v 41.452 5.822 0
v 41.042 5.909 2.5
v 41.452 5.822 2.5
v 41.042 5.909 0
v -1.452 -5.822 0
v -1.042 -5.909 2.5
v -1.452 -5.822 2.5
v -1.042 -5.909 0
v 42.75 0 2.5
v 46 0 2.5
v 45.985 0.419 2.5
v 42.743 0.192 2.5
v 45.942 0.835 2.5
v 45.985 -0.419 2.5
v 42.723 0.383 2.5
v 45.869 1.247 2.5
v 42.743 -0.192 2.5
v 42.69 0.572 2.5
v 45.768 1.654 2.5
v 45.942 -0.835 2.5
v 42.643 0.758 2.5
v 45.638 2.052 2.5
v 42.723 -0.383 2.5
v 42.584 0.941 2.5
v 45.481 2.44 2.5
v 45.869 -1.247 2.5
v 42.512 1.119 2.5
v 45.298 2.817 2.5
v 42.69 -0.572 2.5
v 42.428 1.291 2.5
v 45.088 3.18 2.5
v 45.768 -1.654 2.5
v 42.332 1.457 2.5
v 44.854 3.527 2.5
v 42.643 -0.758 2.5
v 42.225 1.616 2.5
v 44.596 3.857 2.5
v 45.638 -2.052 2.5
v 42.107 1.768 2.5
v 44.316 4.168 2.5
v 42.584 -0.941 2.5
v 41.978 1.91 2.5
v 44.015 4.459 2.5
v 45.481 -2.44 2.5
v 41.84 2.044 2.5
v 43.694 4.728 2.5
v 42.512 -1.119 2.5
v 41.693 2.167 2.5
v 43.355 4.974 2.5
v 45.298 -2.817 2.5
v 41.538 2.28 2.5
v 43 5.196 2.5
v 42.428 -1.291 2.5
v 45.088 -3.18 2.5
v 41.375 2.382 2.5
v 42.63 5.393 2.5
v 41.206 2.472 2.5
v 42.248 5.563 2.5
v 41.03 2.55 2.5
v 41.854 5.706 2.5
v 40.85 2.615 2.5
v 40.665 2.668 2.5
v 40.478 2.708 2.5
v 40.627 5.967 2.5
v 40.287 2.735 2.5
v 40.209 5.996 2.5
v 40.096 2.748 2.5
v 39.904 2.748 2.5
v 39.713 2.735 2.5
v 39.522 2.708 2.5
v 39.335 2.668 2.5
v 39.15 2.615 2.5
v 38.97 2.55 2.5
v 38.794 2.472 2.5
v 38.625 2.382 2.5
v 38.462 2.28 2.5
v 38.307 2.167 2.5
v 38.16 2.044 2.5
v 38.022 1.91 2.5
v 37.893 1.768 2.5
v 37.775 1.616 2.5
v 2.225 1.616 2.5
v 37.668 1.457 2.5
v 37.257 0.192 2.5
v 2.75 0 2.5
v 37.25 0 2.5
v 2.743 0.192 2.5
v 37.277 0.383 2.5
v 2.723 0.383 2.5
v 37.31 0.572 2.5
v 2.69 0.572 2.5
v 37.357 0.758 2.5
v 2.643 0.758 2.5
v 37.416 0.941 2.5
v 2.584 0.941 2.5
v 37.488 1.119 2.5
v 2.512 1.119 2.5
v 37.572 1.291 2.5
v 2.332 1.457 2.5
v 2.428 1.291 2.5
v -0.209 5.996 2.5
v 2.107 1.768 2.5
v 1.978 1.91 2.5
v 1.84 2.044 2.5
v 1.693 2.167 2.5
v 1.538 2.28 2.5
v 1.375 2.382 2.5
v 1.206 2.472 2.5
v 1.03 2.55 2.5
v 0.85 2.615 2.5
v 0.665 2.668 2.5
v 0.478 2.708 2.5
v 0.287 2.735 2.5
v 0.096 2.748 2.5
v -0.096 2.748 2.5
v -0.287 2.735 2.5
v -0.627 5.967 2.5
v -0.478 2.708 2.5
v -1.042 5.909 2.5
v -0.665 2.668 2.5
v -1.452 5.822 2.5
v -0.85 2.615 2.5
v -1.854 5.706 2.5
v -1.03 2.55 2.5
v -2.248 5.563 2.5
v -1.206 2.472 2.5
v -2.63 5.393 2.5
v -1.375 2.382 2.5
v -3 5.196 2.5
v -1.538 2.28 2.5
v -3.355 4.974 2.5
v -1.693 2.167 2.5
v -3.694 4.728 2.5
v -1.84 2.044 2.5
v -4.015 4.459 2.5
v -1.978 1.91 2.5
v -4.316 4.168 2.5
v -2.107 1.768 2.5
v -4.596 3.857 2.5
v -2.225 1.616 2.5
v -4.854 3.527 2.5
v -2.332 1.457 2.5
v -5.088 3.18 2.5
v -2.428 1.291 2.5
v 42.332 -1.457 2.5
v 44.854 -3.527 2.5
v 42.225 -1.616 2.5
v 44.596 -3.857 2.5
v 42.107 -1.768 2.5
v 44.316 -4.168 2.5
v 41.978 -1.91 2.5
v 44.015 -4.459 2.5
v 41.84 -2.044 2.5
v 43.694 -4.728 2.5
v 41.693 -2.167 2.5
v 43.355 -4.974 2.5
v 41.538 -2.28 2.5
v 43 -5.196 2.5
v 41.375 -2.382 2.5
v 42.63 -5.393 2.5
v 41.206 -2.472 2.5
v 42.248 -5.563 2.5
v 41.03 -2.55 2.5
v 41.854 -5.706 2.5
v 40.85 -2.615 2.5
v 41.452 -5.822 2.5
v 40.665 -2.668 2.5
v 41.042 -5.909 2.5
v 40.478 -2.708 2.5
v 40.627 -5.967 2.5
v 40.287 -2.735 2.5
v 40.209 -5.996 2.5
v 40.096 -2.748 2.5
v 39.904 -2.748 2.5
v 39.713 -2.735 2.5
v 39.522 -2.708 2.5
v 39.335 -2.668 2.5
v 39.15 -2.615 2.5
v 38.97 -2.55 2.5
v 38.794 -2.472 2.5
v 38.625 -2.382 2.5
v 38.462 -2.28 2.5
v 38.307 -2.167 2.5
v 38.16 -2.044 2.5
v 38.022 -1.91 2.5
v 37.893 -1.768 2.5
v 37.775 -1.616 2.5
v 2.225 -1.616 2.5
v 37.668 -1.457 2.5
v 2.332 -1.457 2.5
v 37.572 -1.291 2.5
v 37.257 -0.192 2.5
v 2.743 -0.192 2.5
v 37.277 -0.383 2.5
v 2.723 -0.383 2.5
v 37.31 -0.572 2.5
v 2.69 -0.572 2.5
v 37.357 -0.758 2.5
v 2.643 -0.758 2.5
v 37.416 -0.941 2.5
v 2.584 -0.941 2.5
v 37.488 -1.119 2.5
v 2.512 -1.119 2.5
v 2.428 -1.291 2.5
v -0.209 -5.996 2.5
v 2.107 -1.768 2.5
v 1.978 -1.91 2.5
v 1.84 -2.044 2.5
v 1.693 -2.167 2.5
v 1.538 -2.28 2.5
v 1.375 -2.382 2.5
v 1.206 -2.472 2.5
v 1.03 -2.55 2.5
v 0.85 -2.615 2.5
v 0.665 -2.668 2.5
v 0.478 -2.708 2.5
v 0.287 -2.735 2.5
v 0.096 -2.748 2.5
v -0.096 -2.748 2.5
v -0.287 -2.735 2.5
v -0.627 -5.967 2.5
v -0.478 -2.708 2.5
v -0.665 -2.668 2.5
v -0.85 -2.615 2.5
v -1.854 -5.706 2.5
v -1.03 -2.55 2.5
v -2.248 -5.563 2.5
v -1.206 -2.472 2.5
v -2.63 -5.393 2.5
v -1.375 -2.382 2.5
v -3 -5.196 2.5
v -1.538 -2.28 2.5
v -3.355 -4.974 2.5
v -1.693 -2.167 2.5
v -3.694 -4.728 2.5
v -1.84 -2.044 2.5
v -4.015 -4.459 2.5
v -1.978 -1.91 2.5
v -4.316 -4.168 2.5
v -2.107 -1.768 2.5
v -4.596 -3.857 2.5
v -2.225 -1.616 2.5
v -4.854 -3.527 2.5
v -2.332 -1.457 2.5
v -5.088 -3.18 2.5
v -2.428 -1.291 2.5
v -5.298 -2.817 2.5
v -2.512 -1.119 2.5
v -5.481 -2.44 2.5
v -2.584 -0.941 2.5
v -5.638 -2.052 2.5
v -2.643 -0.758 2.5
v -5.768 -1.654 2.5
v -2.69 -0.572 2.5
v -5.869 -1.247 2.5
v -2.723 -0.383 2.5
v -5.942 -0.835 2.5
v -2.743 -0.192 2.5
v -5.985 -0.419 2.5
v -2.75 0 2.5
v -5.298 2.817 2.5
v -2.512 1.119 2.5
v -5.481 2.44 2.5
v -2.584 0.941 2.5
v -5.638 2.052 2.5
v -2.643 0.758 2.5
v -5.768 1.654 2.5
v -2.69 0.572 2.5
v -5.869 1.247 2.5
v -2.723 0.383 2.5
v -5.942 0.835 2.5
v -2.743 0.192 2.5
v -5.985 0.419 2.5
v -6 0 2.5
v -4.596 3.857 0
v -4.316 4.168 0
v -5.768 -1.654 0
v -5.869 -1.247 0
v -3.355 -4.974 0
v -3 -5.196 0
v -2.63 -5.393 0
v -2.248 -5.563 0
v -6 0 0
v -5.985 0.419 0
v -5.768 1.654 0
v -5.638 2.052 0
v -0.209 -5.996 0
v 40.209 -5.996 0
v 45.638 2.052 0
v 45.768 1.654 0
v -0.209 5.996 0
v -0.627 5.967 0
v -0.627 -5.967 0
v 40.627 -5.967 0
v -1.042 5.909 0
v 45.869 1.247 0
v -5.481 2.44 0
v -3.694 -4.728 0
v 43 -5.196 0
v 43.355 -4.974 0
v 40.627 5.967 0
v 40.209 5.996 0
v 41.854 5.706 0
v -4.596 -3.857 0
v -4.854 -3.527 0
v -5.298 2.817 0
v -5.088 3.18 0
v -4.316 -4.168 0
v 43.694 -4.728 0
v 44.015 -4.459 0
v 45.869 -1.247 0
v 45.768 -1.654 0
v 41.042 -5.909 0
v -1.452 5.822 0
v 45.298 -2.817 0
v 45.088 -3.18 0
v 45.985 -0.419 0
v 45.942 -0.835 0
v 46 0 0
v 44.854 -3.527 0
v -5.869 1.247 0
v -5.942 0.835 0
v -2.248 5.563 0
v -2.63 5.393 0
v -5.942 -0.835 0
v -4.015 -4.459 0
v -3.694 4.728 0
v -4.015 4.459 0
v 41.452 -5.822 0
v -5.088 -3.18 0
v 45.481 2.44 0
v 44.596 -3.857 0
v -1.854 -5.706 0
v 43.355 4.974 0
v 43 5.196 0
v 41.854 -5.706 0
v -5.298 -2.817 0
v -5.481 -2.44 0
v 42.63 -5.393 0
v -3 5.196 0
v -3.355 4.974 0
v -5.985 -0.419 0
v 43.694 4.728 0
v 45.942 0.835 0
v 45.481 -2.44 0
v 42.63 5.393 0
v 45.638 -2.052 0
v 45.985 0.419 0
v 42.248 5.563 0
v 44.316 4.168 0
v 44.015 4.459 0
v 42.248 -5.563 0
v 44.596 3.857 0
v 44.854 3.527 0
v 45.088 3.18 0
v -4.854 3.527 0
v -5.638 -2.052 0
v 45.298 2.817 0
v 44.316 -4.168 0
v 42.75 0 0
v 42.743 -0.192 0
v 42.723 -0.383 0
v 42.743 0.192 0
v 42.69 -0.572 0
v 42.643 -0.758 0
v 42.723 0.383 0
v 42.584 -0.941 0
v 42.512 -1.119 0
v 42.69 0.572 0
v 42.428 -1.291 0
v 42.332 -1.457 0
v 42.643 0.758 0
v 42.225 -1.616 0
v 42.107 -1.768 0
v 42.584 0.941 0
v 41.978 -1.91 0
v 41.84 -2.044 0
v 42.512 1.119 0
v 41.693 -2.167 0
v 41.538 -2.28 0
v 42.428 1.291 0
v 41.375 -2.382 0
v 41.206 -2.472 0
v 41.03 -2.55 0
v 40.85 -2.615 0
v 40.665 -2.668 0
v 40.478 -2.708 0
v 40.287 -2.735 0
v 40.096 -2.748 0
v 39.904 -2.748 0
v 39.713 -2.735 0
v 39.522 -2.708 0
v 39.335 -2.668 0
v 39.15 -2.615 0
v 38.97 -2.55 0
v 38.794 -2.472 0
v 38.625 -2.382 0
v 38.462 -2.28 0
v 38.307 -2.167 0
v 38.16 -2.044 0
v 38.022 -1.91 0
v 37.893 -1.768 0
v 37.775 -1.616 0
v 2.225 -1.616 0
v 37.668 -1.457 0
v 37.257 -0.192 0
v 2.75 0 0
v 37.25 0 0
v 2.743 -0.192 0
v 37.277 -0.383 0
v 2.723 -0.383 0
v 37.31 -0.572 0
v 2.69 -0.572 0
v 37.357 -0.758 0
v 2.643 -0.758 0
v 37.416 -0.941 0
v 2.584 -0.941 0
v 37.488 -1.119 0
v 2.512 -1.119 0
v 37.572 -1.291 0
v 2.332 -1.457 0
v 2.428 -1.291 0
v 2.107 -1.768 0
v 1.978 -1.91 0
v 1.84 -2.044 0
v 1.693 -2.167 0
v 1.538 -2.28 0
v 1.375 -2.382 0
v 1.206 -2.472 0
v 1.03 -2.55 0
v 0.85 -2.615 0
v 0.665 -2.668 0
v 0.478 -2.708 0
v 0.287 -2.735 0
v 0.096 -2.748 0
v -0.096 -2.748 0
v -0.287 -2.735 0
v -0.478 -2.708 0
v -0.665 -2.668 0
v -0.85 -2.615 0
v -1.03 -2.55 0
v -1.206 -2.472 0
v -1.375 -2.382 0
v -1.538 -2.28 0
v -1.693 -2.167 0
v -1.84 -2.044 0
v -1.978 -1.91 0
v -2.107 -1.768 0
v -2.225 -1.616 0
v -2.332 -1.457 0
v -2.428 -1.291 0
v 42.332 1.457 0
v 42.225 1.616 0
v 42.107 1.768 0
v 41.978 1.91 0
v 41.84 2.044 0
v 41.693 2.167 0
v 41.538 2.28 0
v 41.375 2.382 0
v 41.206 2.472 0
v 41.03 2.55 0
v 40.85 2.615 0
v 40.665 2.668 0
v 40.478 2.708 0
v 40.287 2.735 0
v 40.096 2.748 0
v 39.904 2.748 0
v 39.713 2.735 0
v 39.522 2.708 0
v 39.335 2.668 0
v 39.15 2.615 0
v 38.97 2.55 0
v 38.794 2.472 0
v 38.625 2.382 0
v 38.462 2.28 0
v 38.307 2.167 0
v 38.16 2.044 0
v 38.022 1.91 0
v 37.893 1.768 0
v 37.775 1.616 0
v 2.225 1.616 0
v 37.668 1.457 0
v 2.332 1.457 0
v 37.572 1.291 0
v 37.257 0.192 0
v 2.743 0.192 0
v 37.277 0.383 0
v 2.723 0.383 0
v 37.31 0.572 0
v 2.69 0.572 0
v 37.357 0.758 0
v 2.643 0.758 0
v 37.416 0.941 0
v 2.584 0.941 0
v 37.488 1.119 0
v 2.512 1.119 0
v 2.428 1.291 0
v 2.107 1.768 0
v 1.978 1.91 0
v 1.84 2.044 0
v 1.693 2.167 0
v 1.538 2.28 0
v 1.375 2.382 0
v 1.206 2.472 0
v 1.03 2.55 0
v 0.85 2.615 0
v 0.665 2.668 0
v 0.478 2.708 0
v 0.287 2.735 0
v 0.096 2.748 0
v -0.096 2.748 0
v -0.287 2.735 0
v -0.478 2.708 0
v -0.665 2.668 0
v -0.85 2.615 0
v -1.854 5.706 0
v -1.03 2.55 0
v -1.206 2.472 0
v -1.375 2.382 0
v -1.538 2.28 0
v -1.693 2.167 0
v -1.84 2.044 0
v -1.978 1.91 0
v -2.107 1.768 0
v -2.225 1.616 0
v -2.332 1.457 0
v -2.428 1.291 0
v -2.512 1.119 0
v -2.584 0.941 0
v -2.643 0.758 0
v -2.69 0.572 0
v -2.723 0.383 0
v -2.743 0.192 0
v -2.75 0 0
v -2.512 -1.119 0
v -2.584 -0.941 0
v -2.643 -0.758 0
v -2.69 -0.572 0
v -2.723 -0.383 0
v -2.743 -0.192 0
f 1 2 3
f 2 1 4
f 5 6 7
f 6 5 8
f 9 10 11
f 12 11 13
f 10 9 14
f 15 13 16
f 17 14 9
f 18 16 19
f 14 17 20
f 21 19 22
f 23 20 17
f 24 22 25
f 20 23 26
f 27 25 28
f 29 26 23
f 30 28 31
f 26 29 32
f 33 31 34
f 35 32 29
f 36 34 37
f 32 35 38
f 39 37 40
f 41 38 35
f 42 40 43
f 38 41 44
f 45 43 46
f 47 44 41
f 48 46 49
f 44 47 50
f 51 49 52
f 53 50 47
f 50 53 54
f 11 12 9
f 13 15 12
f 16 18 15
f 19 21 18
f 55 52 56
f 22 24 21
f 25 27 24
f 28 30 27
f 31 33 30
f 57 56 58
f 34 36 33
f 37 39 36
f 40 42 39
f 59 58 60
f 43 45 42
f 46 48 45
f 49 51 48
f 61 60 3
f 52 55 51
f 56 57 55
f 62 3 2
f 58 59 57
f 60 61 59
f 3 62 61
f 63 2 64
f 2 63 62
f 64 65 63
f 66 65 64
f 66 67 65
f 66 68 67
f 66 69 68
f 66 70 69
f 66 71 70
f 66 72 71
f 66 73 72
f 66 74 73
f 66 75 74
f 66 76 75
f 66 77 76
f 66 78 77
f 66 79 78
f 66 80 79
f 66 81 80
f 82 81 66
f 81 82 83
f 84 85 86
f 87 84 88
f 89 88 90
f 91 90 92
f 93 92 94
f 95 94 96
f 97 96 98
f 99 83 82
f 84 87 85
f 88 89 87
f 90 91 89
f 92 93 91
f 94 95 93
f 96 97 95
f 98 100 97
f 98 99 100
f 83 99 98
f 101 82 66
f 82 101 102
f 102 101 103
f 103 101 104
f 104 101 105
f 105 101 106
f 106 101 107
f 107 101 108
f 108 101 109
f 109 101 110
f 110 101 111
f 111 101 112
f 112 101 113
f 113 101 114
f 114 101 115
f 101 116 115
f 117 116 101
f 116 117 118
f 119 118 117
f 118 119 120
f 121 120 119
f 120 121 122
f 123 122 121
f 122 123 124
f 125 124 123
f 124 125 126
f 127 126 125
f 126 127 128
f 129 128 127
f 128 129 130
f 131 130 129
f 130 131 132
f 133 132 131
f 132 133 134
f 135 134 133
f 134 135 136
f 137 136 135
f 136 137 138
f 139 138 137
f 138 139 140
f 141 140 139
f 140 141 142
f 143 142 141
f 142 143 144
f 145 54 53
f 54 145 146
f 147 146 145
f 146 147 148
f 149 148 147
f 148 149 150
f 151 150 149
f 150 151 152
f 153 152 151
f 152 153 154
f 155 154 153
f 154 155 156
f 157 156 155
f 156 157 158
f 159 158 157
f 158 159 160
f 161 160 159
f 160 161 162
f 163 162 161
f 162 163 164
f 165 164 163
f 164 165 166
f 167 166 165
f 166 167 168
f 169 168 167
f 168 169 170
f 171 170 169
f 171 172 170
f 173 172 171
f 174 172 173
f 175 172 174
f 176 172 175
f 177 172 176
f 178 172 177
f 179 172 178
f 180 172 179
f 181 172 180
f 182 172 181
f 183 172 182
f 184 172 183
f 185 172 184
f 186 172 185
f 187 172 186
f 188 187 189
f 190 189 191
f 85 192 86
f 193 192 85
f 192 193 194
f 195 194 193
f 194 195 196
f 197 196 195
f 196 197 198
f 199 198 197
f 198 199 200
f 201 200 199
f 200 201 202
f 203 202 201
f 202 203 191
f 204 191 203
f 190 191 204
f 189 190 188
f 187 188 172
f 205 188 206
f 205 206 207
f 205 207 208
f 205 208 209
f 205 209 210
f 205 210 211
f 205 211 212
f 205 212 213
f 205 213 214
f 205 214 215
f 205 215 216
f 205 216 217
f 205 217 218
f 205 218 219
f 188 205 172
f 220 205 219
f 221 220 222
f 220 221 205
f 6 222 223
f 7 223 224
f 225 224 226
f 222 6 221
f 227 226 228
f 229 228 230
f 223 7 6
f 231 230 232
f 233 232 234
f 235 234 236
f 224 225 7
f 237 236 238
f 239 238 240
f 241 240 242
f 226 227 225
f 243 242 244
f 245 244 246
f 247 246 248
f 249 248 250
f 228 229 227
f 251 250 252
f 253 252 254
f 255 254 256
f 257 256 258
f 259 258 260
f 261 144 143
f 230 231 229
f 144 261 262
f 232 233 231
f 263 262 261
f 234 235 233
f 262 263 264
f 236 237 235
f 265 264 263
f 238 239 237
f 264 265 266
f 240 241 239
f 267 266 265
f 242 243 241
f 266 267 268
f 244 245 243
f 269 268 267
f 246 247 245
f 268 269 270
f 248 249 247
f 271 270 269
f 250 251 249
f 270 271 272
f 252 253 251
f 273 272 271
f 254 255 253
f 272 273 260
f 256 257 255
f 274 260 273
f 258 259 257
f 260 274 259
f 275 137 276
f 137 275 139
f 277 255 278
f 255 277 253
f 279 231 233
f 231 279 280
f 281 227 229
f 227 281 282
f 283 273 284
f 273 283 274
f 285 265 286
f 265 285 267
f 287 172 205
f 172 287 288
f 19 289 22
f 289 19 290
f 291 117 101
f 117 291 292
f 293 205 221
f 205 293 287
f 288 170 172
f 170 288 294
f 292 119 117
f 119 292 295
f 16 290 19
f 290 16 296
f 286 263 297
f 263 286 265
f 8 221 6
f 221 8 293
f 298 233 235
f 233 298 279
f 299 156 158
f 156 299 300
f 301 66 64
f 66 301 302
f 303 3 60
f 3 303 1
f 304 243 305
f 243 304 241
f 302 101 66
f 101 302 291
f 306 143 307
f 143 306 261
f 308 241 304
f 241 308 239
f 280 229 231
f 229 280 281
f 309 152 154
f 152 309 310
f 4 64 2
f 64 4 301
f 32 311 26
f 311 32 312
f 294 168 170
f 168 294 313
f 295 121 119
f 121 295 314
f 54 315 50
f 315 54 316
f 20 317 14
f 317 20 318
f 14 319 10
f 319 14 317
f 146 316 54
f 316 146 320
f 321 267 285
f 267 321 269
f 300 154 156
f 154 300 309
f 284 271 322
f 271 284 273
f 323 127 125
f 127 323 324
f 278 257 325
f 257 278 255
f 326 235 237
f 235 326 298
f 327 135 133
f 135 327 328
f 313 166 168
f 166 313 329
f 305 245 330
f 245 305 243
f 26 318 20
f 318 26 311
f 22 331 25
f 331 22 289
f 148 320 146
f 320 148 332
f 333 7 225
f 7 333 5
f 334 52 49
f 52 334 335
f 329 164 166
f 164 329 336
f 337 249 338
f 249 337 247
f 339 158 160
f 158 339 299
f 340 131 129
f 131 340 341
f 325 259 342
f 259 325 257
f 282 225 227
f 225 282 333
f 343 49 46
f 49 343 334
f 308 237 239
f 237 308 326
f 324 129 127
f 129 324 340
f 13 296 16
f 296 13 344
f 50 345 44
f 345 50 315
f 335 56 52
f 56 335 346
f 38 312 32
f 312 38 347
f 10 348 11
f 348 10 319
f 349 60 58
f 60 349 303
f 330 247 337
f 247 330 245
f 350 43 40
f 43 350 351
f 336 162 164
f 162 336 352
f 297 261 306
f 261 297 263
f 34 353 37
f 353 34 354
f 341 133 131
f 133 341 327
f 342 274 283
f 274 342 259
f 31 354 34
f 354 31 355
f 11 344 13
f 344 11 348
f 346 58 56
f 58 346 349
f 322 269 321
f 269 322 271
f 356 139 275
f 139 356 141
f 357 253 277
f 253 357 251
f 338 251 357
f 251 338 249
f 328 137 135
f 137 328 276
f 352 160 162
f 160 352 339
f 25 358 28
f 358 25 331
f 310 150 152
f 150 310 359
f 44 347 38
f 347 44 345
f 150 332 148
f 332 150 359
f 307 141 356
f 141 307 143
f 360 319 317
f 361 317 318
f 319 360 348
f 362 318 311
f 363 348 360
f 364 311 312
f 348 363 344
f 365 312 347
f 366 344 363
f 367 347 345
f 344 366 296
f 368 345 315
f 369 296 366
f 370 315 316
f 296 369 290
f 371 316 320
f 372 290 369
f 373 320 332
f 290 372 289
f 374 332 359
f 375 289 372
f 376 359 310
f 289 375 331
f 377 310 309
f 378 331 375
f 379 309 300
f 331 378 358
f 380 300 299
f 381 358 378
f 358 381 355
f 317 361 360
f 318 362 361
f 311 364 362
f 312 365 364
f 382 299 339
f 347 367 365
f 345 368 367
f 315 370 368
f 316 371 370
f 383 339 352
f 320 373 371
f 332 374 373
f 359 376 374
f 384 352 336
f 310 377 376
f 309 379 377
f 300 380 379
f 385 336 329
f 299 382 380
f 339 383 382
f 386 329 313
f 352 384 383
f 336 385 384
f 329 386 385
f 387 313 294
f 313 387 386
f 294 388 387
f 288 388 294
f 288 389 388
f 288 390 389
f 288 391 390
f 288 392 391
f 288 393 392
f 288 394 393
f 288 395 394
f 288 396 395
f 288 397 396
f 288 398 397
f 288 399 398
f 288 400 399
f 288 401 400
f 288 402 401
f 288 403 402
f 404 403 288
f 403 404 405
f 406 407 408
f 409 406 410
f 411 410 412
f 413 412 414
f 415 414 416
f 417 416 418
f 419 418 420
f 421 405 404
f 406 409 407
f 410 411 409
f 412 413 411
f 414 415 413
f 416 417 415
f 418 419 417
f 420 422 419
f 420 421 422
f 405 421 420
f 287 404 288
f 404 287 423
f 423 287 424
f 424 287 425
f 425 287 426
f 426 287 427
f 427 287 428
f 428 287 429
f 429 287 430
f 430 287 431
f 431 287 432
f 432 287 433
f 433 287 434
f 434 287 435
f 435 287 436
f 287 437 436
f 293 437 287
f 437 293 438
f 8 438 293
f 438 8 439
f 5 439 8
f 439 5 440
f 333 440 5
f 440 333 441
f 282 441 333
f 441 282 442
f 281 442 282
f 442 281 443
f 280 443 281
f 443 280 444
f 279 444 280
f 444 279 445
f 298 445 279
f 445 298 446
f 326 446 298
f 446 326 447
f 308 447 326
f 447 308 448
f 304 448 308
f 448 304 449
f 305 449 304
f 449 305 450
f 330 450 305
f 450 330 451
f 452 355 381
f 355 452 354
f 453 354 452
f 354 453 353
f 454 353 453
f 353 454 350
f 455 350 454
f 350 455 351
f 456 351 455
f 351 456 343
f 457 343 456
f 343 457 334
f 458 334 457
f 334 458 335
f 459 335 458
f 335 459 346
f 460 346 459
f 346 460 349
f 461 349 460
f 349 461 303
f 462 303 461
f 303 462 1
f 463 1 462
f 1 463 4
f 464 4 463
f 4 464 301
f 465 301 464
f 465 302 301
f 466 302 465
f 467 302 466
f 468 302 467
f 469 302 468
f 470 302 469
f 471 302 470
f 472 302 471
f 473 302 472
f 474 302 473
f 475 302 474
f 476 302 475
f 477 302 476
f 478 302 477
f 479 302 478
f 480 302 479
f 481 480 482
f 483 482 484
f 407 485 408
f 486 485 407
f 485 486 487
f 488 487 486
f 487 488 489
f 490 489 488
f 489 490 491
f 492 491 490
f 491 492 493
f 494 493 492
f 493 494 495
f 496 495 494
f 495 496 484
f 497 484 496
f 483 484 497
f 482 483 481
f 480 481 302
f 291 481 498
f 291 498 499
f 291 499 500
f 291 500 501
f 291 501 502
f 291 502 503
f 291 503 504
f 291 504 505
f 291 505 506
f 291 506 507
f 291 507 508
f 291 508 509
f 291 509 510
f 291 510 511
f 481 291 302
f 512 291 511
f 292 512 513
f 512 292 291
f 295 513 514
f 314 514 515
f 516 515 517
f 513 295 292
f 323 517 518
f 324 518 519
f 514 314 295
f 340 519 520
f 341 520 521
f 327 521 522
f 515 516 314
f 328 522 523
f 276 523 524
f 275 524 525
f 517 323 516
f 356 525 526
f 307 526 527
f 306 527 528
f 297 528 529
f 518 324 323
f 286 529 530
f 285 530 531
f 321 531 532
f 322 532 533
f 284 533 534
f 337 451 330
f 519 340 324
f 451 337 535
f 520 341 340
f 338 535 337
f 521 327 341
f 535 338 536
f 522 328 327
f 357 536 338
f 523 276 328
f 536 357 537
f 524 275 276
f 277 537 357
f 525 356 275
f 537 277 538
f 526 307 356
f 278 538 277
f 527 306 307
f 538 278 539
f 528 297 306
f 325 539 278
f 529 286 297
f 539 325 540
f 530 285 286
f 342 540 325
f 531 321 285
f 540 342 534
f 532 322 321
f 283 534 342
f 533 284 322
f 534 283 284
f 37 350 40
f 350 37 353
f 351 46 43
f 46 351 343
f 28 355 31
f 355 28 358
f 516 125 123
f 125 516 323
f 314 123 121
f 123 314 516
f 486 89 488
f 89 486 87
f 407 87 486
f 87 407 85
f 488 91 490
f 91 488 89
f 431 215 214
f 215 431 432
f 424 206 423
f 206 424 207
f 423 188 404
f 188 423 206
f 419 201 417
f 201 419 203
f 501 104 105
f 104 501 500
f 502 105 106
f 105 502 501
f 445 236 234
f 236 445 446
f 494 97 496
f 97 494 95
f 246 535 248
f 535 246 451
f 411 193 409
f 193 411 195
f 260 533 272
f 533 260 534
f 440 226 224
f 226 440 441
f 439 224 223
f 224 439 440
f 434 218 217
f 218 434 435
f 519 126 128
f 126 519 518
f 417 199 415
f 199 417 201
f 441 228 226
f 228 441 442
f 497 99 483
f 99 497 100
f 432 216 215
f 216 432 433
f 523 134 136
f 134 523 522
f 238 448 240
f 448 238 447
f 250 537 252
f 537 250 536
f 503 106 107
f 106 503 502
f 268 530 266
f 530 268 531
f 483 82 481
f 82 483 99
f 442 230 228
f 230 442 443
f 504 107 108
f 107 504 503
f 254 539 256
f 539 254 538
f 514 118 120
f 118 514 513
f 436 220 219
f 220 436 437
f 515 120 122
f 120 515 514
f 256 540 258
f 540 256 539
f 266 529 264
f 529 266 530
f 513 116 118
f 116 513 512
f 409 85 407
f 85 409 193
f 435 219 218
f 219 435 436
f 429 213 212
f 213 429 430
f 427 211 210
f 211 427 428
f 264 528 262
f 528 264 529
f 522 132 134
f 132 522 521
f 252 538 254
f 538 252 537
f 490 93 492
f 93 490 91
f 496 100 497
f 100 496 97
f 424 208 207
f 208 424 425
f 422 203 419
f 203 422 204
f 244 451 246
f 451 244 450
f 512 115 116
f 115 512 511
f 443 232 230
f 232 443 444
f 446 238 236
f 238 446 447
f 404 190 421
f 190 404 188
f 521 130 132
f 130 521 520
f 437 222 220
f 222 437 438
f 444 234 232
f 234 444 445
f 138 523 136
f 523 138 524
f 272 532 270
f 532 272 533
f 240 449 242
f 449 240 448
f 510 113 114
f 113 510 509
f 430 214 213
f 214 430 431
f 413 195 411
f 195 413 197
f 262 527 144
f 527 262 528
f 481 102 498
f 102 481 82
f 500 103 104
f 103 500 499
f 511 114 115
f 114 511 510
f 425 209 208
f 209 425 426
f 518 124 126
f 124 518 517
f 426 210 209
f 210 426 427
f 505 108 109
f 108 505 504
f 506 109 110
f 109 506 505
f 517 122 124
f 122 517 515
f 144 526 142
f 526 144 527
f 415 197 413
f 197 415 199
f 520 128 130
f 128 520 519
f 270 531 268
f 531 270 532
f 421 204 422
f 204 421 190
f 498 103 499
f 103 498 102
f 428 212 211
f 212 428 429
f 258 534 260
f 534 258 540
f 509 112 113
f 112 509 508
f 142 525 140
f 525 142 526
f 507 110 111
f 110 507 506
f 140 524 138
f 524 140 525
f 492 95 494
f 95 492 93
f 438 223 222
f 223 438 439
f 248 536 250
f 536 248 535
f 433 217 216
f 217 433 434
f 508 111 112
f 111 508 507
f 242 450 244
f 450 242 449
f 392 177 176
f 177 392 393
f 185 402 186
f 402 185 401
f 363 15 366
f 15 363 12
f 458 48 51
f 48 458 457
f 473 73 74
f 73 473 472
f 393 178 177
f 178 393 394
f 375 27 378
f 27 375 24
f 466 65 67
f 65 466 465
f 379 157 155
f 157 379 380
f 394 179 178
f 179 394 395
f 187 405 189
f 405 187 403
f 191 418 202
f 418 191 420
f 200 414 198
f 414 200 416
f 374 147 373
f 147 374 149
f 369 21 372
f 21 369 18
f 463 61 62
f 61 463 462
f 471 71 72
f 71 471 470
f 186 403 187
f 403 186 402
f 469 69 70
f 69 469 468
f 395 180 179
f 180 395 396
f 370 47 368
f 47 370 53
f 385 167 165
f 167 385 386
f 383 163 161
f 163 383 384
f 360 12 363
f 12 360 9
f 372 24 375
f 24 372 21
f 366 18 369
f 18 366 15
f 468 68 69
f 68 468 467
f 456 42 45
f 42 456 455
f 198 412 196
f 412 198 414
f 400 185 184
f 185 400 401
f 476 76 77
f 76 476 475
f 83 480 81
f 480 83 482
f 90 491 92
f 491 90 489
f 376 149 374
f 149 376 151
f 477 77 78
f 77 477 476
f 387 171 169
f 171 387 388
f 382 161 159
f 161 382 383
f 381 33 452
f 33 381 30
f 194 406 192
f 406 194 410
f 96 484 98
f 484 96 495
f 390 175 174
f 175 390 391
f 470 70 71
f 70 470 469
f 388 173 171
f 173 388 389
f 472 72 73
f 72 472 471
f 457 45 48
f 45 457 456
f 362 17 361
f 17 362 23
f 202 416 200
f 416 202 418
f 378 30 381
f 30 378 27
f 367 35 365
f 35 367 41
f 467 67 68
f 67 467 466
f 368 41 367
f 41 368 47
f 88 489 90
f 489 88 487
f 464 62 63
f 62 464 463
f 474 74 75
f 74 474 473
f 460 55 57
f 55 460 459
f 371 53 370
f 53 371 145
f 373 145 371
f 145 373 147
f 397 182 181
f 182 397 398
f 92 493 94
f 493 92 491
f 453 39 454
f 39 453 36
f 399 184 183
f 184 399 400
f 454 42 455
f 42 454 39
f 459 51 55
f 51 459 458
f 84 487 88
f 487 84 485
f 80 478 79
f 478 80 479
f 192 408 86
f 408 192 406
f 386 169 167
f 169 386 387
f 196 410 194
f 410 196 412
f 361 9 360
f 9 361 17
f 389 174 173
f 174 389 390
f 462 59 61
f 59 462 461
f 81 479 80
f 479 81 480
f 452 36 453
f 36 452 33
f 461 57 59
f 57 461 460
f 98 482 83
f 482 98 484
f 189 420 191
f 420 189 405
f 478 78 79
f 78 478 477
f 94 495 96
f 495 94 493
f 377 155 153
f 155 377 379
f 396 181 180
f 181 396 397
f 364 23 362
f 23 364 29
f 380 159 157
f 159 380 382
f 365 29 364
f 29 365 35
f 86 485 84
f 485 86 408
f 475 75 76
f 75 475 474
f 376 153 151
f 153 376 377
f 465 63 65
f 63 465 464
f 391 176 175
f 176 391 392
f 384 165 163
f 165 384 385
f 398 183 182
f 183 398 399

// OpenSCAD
$fn = 90;

H = 2.5;
D = 5.5;
OUTDER_D = 12;

difference() {
    hull() {
        cylinder(d=OUTDER_D, h=H);
        translate([40, 0, 0]) cylinder(d=OUTDER_D, h=H);
    }    
    cylinder(d=D, h=H);
    translate([40, 0, 0]) cylinder(d=D, h=H);
}
